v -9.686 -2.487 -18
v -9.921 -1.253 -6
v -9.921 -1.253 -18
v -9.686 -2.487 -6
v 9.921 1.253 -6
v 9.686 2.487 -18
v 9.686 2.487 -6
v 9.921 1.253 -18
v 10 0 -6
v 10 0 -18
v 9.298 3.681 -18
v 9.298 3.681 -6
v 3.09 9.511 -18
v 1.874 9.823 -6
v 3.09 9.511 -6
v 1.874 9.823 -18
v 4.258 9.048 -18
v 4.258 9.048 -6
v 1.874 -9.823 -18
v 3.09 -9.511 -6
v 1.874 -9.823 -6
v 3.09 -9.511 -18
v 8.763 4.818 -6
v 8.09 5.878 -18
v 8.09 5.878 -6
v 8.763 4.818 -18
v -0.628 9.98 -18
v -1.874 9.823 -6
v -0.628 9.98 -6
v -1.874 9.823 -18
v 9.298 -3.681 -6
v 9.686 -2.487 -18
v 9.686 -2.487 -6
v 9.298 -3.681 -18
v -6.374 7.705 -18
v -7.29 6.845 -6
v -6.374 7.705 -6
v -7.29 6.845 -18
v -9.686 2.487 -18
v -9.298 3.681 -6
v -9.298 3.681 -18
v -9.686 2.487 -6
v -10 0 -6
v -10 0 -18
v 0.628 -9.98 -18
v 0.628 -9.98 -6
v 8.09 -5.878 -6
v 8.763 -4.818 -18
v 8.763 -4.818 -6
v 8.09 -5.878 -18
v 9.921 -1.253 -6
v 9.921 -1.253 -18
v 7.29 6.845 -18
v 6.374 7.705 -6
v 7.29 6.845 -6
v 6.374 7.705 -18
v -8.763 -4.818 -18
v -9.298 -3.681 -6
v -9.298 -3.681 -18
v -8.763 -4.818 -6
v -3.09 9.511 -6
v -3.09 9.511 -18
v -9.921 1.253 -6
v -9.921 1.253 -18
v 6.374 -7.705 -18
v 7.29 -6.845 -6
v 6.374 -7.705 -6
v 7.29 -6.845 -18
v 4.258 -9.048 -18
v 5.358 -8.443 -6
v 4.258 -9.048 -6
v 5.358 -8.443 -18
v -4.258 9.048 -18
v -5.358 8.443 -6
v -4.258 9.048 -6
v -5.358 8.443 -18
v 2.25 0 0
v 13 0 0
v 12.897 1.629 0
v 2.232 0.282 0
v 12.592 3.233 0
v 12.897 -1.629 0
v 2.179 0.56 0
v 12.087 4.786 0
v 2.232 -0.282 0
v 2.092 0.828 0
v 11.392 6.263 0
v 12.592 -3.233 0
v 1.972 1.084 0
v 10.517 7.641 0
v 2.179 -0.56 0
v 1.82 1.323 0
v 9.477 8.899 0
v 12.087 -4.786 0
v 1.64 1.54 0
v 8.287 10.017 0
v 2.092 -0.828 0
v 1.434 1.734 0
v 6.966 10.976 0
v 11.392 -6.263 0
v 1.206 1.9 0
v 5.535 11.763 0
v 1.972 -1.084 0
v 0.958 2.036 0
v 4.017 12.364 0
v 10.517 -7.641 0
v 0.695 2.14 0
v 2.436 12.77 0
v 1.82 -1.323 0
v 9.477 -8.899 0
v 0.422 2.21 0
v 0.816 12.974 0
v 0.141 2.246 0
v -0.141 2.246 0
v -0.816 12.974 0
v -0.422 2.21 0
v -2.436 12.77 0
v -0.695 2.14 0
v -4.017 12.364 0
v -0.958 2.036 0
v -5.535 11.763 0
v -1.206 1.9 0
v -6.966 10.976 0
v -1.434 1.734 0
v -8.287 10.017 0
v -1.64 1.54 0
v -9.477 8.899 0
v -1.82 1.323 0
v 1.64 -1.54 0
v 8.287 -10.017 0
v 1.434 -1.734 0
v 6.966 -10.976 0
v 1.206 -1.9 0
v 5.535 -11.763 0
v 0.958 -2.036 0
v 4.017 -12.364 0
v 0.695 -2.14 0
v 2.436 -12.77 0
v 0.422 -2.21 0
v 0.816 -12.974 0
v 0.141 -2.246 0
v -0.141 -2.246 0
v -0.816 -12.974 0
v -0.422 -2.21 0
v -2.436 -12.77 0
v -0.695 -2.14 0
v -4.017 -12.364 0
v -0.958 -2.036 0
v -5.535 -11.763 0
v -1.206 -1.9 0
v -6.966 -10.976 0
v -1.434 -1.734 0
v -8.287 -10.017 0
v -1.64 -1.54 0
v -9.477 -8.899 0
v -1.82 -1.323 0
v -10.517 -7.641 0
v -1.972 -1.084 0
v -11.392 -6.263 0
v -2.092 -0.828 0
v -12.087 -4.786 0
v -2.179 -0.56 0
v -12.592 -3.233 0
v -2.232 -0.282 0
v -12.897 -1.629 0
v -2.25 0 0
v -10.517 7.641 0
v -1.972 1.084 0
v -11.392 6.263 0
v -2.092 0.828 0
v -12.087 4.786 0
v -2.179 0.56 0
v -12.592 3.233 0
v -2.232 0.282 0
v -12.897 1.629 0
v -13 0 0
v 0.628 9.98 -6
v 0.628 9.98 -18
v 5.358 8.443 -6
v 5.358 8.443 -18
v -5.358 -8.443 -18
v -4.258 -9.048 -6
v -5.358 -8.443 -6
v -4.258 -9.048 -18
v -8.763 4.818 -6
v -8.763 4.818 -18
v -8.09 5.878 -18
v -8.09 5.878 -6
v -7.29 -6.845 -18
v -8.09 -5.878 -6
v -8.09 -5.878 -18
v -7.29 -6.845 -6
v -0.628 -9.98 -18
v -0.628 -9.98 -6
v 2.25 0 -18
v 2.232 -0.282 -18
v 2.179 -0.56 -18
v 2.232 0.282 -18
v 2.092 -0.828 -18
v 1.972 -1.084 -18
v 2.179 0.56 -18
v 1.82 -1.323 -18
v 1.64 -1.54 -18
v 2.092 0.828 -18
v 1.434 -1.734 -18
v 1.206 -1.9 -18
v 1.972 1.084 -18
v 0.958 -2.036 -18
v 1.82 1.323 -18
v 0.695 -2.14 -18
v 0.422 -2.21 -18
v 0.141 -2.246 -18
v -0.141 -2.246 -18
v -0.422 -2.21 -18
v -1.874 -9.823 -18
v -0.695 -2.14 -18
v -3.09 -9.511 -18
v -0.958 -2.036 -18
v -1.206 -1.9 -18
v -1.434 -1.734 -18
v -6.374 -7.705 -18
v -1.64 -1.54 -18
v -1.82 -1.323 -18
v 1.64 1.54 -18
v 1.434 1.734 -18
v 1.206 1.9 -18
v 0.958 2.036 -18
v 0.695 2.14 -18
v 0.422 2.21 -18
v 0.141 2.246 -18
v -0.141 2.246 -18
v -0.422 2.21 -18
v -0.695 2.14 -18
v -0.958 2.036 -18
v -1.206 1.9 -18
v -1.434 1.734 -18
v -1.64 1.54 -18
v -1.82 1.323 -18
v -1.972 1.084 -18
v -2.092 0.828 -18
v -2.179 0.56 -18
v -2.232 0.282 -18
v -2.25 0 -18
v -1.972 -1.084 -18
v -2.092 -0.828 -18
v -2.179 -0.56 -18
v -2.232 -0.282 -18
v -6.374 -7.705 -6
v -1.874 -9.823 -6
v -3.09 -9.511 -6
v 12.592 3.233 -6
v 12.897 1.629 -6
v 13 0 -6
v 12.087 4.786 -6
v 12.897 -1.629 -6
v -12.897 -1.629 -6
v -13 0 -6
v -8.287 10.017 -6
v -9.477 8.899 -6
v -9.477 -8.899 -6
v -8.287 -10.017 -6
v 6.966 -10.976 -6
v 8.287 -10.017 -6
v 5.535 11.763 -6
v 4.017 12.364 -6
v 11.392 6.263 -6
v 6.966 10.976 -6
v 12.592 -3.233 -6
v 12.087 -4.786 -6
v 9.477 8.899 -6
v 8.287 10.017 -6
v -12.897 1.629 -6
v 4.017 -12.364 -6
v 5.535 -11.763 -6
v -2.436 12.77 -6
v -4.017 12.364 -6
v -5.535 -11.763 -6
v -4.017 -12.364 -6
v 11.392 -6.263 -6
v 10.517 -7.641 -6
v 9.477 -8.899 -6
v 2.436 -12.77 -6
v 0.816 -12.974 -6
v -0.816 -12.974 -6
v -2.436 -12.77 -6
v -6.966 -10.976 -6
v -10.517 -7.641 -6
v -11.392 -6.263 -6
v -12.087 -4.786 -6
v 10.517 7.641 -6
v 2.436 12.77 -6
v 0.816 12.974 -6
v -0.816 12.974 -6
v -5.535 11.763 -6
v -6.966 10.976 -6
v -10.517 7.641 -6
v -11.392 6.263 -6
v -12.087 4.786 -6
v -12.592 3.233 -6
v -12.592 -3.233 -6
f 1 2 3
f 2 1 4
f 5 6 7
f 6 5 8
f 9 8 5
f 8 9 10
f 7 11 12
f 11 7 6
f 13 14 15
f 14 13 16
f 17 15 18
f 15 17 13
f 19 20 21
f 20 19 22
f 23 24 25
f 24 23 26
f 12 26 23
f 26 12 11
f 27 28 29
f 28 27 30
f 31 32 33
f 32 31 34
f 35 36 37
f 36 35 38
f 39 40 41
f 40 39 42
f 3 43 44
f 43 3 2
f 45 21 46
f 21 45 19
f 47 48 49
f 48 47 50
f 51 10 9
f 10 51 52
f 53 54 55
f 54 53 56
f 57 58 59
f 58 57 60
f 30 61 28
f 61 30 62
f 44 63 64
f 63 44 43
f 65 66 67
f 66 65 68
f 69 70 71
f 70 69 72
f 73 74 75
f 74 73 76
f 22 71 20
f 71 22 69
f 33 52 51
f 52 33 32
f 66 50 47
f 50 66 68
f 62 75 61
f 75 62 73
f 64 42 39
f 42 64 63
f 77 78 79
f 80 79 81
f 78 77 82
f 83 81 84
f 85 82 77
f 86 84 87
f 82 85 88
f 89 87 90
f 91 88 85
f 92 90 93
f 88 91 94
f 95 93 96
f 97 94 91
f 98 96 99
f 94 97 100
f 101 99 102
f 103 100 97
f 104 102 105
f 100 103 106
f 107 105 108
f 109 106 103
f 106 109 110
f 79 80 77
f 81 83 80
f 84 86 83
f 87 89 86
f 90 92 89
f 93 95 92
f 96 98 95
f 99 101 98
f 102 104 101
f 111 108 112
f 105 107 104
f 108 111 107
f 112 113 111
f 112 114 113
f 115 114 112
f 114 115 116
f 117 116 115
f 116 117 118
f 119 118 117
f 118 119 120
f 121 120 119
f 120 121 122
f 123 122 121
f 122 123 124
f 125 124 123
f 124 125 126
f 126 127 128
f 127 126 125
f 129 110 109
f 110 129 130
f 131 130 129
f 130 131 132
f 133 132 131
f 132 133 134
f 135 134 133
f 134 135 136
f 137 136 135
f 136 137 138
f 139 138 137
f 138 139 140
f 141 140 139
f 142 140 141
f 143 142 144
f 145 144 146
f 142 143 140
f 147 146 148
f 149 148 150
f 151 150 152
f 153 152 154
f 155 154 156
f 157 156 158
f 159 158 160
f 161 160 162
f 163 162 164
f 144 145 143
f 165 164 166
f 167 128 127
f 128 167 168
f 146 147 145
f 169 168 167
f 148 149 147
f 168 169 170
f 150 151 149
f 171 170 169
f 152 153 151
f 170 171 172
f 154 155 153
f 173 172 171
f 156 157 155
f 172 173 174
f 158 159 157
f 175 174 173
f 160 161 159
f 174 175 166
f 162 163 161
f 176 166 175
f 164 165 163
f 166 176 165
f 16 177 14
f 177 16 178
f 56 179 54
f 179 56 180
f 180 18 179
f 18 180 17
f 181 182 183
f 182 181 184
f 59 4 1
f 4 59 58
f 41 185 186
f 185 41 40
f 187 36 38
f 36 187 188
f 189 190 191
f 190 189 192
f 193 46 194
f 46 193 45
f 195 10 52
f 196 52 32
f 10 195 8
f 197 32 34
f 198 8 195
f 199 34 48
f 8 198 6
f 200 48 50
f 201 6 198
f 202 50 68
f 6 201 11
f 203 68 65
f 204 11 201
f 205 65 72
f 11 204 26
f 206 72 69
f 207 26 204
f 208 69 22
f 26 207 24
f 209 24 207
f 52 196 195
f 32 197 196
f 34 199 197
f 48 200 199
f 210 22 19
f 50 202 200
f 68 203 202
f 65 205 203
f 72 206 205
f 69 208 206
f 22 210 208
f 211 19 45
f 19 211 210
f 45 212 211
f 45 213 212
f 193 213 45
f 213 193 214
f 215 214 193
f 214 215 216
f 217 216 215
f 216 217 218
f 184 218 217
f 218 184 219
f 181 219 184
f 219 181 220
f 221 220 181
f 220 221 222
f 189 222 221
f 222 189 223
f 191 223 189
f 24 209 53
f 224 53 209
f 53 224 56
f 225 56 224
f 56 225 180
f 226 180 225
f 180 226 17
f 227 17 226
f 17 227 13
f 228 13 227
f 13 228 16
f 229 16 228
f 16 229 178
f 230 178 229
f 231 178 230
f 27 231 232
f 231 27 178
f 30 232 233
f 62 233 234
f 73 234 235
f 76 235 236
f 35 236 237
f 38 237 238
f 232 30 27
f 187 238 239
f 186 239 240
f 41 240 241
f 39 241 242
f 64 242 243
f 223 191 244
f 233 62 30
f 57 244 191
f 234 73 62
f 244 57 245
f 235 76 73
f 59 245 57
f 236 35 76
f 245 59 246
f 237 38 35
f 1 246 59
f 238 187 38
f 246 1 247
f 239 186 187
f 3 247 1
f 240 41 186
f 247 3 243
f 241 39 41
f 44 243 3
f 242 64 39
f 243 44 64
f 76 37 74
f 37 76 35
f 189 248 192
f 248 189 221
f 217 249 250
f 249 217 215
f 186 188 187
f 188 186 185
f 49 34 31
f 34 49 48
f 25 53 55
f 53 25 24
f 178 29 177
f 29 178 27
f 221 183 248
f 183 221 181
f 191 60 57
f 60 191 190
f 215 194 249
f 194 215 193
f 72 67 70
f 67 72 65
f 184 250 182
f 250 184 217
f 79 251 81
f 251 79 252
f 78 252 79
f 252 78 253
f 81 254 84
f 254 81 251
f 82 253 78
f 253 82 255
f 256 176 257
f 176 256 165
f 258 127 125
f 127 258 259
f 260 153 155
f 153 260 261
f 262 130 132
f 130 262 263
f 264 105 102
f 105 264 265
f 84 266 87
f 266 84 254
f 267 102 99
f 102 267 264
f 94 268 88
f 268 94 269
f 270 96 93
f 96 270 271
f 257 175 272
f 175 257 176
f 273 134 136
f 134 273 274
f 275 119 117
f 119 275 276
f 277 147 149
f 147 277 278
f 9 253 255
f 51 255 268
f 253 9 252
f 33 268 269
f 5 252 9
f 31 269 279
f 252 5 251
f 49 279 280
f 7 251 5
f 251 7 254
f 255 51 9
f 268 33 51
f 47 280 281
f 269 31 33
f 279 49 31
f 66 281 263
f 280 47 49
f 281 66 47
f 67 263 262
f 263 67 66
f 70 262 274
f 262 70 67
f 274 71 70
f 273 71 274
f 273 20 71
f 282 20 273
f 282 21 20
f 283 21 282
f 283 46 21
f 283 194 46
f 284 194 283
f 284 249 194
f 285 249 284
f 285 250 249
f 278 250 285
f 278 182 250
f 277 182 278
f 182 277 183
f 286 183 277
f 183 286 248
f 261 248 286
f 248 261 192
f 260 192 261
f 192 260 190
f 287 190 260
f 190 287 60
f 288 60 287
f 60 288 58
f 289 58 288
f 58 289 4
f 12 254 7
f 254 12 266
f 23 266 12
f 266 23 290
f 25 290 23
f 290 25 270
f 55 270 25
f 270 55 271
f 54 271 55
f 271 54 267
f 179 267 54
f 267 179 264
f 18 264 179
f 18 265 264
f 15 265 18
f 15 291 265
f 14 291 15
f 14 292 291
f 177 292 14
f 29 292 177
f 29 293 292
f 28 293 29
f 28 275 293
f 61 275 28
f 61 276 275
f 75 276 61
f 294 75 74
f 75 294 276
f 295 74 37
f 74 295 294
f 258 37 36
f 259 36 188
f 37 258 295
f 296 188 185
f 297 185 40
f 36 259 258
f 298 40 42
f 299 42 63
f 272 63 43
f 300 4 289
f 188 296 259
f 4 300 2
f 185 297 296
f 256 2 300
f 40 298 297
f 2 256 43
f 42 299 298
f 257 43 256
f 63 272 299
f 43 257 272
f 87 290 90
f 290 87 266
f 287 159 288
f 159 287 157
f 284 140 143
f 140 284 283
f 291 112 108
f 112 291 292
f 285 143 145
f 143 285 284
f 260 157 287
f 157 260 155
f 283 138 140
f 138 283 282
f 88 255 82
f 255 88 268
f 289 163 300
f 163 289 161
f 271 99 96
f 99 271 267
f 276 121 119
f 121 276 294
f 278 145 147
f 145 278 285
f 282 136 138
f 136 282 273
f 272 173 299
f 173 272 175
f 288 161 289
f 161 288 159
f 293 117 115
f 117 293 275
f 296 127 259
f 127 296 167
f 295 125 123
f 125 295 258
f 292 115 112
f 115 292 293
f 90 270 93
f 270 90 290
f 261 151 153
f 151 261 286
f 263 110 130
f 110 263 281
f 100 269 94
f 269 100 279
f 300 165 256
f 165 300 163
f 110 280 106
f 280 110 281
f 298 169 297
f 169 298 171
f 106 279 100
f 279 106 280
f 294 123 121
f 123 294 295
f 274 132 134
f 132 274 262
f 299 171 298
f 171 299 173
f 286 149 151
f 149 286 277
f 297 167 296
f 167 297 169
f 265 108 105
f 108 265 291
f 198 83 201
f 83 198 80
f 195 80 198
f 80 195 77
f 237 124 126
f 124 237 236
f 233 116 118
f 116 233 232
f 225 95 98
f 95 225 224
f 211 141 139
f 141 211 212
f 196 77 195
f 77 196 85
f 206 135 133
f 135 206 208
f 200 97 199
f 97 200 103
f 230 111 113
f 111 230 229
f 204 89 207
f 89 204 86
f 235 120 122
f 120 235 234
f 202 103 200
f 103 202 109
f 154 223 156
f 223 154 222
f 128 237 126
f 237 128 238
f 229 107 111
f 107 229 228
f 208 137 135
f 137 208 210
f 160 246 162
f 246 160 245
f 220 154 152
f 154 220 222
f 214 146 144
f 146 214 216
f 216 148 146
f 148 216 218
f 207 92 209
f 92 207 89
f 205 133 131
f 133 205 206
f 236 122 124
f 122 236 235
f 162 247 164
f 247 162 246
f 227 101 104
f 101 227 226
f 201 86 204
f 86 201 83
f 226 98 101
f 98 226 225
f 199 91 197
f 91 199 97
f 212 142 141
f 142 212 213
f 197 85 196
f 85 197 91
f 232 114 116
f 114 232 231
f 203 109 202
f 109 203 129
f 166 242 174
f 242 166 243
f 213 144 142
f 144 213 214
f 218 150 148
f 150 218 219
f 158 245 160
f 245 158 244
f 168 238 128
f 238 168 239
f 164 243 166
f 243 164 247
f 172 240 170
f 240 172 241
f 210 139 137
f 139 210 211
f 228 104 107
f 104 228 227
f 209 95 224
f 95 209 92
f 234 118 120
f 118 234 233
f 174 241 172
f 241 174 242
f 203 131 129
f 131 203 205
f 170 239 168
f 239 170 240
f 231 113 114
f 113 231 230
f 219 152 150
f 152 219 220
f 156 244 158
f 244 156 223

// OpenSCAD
$fn = 50;


difference() {
	union() {
		translate(v = [0, 0, -18.0000000000]) {
			cylinder(h = 18, r = 10.0000000000);
		}
		translate(v = [0, 0, -6.0000000000]) {
			cylinder(h = 6, r = 13.0000000000);
		}
	}
	union() {
		#translate(v = [0, 0, -18]) {
			cylinder(h = 18, r = 2.2500000000);
		}
	}
}
